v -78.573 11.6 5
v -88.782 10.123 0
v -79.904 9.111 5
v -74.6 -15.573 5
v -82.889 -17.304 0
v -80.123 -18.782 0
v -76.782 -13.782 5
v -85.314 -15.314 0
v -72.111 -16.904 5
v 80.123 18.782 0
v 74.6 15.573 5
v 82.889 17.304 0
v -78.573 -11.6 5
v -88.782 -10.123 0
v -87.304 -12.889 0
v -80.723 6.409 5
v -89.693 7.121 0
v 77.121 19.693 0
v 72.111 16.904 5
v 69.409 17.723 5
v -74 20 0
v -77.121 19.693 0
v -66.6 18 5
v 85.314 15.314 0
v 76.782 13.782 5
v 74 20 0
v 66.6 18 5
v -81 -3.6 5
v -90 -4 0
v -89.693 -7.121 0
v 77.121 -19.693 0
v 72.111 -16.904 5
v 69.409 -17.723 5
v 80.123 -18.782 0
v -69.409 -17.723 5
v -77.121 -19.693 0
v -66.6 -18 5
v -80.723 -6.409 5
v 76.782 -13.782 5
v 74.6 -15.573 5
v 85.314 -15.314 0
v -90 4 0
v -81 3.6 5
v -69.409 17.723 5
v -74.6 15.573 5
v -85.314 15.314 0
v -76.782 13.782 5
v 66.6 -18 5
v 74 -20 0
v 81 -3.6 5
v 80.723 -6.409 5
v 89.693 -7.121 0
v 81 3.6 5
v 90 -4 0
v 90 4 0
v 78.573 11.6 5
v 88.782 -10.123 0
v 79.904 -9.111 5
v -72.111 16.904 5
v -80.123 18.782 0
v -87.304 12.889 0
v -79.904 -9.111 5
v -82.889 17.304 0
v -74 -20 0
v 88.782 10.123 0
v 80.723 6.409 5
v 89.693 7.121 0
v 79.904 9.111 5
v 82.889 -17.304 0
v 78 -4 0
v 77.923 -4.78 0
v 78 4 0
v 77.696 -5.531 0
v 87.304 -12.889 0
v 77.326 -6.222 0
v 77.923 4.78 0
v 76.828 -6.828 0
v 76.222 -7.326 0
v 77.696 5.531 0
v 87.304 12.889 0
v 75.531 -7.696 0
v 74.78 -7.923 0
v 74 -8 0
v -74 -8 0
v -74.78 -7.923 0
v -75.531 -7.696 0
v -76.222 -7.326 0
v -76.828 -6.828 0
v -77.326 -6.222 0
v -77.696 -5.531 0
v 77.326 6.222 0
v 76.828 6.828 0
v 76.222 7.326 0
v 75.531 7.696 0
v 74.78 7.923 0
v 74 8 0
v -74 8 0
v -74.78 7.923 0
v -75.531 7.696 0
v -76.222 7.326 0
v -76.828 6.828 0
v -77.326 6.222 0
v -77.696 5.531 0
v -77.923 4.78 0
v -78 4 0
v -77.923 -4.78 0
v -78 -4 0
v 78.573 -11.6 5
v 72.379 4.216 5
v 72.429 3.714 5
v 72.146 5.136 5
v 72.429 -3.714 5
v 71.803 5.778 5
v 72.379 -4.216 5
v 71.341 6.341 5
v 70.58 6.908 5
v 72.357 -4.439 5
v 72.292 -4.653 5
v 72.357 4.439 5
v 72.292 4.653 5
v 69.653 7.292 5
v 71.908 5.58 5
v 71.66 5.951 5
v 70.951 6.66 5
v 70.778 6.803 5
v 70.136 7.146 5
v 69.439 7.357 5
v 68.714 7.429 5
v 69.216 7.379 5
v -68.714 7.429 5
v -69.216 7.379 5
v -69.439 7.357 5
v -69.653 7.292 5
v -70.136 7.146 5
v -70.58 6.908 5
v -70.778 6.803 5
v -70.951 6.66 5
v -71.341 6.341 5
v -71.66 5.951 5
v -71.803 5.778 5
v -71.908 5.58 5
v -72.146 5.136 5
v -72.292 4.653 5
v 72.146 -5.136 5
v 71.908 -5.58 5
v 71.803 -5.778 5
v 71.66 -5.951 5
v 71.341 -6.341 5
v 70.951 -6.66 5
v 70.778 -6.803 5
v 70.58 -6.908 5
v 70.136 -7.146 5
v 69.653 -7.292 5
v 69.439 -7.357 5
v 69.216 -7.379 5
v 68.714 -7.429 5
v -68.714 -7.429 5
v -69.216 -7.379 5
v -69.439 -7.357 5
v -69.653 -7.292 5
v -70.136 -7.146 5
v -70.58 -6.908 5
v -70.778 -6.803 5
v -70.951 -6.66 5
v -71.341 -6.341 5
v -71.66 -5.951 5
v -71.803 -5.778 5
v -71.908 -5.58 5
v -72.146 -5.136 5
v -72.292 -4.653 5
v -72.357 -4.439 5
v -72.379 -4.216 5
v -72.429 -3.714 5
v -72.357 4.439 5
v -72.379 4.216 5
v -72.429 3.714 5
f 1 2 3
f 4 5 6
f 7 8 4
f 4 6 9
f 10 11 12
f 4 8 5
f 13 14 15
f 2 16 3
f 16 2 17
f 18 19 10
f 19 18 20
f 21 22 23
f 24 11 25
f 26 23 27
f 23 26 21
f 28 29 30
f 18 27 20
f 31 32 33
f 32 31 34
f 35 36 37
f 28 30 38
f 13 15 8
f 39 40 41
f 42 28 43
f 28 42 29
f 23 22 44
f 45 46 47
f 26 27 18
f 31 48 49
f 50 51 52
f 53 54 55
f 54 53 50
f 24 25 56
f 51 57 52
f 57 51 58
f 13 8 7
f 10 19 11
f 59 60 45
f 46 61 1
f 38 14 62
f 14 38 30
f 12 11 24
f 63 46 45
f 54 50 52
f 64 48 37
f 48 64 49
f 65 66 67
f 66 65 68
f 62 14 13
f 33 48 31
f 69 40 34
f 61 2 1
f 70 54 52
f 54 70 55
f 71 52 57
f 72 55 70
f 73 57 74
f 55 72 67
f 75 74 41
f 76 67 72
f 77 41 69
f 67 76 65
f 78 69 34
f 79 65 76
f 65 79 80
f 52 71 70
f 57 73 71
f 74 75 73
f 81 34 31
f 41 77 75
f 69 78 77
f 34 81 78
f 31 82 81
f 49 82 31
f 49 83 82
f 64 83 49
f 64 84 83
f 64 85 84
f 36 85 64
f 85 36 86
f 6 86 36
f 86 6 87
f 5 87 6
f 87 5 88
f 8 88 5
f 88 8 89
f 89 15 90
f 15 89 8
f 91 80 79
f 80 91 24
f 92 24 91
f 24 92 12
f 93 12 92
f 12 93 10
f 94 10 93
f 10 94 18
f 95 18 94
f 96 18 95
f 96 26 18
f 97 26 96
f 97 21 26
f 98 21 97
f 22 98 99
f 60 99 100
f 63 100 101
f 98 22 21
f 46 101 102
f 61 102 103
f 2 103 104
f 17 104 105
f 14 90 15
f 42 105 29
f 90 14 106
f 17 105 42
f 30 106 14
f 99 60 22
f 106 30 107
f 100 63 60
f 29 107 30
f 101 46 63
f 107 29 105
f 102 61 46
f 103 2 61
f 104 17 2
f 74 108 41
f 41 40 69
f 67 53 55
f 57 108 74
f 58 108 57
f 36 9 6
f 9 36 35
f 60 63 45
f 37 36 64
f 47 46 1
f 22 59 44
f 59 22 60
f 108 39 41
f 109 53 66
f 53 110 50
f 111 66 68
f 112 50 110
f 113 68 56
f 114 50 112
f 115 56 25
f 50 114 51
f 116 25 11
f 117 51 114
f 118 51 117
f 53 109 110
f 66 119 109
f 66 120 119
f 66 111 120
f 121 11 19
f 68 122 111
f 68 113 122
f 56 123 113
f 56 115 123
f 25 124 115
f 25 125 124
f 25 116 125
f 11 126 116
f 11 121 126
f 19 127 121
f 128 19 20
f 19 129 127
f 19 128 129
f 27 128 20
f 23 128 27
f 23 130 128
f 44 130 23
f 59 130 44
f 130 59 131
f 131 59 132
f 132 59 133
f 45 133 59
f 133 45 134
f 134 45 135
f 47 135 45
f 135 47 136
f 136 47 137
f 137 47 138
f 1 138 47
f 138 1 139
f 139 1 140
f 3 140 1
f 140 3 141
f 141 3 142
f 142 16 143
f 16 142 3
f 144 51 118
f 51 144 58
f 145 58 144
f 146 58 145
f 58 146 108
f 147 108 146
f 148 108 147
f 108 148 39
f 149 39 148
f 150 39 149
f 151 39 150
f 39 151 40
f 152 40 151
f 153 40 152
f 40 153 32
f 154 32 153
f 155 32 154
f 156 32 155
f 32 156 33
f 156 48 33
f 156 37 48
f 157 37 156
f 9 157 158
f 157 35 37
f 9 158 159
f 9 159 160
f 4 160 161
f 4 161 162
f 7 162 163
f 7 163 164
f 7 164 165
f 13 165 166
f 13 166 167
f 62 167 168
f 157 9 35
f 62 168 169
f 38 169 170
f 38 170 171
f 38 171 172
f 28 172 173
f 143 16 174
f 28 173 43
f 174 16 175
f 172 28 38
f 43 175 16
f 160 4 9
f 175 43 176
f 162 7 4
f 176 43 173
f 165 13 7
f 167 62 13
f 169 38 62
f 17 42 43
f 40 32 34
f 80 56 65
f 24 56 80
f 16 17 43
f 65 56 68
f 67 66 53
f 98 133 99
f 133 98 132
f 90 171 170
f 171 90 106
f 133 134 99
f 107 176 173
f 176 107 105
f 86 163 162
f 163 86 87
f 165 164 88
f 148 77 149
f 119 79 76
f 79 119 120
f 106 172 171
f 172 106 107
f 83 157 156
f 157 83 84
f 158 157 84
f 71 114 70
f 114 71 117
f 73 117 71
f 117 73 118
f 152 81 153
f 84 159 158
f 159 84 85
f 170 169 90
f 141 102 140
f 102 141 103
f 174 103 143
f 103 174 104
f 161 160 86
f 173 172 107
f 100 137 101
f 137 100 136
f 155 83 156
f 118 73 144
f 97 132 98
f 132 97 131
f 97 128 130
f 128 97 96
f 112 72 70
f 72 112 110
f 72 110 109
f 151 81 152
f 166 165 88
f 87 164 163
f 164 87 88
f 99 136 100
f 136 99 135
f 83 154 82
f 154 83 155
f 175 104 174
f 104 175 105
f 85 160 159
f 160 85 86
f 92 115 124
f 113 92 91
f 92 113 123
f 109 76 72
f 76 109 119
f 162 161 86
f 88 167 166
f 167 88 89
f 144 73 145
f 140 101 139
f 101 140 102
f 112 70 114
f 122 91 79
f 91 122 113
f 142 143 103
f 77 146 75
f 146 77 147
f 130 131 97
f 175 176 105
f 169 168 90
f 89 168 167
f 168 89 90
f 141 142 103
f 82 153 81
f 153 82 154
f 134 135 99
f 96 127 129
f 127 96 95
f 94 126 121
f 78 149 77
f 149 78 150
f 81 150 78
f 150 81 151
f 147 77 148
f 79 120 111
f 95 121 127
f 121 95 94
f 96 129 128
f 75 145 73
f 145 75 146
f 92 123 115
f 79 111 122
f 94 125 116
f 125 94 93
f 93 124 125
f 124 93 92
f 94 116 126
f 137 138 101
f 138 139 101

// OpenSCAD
$fn = 32;

// ----------------------------------------------------------------------
// Display bezel: 180 x 40 mm frame, opening 156x16 mm
// ----------------------------------------------------------------------

// --- parameters (mm) ---
length = 180;             // frame outside length, X
width = 40;               // frame outside width, Y
frame_w = 12;             // frame width
thickness = 5;            // frame thickness
corner_r = 16;            // outside corner radius
chamfer = 0.9;            // outer wall taper
funnel = 0.9;             // inner opening taper
opening_l = 156;          // opening length
opening_w = 16;           // opening width
inner_r = 4;              // opening corner radius

/* rounded-rectangle outlines, generated with loops */
module rounded_ring(l_nom, w_nom, r) {
  hull() {
    for (sx = [-1, 1]) for (sy = [-1, 1])
      translate([sx * (l_nom / 2 - r), sy * (w_nom / 2 - r)]) circle(r = r);
  }
}

difference() {
  /* frame body, drafted so the outer edge is a variable-depth chamfer */
  linear_extrude(height = thickness, scale = chamfer)
    rounded_ring(length, width, corner_r);
  /* viewing opening, drafted the other way for a funnel edge */
  linear_extrude(height = thickness + 2, scale = funnel)
    translate([0, 0, -1]) rounded_ring(opening_l, opening_w, inner_r);
}
